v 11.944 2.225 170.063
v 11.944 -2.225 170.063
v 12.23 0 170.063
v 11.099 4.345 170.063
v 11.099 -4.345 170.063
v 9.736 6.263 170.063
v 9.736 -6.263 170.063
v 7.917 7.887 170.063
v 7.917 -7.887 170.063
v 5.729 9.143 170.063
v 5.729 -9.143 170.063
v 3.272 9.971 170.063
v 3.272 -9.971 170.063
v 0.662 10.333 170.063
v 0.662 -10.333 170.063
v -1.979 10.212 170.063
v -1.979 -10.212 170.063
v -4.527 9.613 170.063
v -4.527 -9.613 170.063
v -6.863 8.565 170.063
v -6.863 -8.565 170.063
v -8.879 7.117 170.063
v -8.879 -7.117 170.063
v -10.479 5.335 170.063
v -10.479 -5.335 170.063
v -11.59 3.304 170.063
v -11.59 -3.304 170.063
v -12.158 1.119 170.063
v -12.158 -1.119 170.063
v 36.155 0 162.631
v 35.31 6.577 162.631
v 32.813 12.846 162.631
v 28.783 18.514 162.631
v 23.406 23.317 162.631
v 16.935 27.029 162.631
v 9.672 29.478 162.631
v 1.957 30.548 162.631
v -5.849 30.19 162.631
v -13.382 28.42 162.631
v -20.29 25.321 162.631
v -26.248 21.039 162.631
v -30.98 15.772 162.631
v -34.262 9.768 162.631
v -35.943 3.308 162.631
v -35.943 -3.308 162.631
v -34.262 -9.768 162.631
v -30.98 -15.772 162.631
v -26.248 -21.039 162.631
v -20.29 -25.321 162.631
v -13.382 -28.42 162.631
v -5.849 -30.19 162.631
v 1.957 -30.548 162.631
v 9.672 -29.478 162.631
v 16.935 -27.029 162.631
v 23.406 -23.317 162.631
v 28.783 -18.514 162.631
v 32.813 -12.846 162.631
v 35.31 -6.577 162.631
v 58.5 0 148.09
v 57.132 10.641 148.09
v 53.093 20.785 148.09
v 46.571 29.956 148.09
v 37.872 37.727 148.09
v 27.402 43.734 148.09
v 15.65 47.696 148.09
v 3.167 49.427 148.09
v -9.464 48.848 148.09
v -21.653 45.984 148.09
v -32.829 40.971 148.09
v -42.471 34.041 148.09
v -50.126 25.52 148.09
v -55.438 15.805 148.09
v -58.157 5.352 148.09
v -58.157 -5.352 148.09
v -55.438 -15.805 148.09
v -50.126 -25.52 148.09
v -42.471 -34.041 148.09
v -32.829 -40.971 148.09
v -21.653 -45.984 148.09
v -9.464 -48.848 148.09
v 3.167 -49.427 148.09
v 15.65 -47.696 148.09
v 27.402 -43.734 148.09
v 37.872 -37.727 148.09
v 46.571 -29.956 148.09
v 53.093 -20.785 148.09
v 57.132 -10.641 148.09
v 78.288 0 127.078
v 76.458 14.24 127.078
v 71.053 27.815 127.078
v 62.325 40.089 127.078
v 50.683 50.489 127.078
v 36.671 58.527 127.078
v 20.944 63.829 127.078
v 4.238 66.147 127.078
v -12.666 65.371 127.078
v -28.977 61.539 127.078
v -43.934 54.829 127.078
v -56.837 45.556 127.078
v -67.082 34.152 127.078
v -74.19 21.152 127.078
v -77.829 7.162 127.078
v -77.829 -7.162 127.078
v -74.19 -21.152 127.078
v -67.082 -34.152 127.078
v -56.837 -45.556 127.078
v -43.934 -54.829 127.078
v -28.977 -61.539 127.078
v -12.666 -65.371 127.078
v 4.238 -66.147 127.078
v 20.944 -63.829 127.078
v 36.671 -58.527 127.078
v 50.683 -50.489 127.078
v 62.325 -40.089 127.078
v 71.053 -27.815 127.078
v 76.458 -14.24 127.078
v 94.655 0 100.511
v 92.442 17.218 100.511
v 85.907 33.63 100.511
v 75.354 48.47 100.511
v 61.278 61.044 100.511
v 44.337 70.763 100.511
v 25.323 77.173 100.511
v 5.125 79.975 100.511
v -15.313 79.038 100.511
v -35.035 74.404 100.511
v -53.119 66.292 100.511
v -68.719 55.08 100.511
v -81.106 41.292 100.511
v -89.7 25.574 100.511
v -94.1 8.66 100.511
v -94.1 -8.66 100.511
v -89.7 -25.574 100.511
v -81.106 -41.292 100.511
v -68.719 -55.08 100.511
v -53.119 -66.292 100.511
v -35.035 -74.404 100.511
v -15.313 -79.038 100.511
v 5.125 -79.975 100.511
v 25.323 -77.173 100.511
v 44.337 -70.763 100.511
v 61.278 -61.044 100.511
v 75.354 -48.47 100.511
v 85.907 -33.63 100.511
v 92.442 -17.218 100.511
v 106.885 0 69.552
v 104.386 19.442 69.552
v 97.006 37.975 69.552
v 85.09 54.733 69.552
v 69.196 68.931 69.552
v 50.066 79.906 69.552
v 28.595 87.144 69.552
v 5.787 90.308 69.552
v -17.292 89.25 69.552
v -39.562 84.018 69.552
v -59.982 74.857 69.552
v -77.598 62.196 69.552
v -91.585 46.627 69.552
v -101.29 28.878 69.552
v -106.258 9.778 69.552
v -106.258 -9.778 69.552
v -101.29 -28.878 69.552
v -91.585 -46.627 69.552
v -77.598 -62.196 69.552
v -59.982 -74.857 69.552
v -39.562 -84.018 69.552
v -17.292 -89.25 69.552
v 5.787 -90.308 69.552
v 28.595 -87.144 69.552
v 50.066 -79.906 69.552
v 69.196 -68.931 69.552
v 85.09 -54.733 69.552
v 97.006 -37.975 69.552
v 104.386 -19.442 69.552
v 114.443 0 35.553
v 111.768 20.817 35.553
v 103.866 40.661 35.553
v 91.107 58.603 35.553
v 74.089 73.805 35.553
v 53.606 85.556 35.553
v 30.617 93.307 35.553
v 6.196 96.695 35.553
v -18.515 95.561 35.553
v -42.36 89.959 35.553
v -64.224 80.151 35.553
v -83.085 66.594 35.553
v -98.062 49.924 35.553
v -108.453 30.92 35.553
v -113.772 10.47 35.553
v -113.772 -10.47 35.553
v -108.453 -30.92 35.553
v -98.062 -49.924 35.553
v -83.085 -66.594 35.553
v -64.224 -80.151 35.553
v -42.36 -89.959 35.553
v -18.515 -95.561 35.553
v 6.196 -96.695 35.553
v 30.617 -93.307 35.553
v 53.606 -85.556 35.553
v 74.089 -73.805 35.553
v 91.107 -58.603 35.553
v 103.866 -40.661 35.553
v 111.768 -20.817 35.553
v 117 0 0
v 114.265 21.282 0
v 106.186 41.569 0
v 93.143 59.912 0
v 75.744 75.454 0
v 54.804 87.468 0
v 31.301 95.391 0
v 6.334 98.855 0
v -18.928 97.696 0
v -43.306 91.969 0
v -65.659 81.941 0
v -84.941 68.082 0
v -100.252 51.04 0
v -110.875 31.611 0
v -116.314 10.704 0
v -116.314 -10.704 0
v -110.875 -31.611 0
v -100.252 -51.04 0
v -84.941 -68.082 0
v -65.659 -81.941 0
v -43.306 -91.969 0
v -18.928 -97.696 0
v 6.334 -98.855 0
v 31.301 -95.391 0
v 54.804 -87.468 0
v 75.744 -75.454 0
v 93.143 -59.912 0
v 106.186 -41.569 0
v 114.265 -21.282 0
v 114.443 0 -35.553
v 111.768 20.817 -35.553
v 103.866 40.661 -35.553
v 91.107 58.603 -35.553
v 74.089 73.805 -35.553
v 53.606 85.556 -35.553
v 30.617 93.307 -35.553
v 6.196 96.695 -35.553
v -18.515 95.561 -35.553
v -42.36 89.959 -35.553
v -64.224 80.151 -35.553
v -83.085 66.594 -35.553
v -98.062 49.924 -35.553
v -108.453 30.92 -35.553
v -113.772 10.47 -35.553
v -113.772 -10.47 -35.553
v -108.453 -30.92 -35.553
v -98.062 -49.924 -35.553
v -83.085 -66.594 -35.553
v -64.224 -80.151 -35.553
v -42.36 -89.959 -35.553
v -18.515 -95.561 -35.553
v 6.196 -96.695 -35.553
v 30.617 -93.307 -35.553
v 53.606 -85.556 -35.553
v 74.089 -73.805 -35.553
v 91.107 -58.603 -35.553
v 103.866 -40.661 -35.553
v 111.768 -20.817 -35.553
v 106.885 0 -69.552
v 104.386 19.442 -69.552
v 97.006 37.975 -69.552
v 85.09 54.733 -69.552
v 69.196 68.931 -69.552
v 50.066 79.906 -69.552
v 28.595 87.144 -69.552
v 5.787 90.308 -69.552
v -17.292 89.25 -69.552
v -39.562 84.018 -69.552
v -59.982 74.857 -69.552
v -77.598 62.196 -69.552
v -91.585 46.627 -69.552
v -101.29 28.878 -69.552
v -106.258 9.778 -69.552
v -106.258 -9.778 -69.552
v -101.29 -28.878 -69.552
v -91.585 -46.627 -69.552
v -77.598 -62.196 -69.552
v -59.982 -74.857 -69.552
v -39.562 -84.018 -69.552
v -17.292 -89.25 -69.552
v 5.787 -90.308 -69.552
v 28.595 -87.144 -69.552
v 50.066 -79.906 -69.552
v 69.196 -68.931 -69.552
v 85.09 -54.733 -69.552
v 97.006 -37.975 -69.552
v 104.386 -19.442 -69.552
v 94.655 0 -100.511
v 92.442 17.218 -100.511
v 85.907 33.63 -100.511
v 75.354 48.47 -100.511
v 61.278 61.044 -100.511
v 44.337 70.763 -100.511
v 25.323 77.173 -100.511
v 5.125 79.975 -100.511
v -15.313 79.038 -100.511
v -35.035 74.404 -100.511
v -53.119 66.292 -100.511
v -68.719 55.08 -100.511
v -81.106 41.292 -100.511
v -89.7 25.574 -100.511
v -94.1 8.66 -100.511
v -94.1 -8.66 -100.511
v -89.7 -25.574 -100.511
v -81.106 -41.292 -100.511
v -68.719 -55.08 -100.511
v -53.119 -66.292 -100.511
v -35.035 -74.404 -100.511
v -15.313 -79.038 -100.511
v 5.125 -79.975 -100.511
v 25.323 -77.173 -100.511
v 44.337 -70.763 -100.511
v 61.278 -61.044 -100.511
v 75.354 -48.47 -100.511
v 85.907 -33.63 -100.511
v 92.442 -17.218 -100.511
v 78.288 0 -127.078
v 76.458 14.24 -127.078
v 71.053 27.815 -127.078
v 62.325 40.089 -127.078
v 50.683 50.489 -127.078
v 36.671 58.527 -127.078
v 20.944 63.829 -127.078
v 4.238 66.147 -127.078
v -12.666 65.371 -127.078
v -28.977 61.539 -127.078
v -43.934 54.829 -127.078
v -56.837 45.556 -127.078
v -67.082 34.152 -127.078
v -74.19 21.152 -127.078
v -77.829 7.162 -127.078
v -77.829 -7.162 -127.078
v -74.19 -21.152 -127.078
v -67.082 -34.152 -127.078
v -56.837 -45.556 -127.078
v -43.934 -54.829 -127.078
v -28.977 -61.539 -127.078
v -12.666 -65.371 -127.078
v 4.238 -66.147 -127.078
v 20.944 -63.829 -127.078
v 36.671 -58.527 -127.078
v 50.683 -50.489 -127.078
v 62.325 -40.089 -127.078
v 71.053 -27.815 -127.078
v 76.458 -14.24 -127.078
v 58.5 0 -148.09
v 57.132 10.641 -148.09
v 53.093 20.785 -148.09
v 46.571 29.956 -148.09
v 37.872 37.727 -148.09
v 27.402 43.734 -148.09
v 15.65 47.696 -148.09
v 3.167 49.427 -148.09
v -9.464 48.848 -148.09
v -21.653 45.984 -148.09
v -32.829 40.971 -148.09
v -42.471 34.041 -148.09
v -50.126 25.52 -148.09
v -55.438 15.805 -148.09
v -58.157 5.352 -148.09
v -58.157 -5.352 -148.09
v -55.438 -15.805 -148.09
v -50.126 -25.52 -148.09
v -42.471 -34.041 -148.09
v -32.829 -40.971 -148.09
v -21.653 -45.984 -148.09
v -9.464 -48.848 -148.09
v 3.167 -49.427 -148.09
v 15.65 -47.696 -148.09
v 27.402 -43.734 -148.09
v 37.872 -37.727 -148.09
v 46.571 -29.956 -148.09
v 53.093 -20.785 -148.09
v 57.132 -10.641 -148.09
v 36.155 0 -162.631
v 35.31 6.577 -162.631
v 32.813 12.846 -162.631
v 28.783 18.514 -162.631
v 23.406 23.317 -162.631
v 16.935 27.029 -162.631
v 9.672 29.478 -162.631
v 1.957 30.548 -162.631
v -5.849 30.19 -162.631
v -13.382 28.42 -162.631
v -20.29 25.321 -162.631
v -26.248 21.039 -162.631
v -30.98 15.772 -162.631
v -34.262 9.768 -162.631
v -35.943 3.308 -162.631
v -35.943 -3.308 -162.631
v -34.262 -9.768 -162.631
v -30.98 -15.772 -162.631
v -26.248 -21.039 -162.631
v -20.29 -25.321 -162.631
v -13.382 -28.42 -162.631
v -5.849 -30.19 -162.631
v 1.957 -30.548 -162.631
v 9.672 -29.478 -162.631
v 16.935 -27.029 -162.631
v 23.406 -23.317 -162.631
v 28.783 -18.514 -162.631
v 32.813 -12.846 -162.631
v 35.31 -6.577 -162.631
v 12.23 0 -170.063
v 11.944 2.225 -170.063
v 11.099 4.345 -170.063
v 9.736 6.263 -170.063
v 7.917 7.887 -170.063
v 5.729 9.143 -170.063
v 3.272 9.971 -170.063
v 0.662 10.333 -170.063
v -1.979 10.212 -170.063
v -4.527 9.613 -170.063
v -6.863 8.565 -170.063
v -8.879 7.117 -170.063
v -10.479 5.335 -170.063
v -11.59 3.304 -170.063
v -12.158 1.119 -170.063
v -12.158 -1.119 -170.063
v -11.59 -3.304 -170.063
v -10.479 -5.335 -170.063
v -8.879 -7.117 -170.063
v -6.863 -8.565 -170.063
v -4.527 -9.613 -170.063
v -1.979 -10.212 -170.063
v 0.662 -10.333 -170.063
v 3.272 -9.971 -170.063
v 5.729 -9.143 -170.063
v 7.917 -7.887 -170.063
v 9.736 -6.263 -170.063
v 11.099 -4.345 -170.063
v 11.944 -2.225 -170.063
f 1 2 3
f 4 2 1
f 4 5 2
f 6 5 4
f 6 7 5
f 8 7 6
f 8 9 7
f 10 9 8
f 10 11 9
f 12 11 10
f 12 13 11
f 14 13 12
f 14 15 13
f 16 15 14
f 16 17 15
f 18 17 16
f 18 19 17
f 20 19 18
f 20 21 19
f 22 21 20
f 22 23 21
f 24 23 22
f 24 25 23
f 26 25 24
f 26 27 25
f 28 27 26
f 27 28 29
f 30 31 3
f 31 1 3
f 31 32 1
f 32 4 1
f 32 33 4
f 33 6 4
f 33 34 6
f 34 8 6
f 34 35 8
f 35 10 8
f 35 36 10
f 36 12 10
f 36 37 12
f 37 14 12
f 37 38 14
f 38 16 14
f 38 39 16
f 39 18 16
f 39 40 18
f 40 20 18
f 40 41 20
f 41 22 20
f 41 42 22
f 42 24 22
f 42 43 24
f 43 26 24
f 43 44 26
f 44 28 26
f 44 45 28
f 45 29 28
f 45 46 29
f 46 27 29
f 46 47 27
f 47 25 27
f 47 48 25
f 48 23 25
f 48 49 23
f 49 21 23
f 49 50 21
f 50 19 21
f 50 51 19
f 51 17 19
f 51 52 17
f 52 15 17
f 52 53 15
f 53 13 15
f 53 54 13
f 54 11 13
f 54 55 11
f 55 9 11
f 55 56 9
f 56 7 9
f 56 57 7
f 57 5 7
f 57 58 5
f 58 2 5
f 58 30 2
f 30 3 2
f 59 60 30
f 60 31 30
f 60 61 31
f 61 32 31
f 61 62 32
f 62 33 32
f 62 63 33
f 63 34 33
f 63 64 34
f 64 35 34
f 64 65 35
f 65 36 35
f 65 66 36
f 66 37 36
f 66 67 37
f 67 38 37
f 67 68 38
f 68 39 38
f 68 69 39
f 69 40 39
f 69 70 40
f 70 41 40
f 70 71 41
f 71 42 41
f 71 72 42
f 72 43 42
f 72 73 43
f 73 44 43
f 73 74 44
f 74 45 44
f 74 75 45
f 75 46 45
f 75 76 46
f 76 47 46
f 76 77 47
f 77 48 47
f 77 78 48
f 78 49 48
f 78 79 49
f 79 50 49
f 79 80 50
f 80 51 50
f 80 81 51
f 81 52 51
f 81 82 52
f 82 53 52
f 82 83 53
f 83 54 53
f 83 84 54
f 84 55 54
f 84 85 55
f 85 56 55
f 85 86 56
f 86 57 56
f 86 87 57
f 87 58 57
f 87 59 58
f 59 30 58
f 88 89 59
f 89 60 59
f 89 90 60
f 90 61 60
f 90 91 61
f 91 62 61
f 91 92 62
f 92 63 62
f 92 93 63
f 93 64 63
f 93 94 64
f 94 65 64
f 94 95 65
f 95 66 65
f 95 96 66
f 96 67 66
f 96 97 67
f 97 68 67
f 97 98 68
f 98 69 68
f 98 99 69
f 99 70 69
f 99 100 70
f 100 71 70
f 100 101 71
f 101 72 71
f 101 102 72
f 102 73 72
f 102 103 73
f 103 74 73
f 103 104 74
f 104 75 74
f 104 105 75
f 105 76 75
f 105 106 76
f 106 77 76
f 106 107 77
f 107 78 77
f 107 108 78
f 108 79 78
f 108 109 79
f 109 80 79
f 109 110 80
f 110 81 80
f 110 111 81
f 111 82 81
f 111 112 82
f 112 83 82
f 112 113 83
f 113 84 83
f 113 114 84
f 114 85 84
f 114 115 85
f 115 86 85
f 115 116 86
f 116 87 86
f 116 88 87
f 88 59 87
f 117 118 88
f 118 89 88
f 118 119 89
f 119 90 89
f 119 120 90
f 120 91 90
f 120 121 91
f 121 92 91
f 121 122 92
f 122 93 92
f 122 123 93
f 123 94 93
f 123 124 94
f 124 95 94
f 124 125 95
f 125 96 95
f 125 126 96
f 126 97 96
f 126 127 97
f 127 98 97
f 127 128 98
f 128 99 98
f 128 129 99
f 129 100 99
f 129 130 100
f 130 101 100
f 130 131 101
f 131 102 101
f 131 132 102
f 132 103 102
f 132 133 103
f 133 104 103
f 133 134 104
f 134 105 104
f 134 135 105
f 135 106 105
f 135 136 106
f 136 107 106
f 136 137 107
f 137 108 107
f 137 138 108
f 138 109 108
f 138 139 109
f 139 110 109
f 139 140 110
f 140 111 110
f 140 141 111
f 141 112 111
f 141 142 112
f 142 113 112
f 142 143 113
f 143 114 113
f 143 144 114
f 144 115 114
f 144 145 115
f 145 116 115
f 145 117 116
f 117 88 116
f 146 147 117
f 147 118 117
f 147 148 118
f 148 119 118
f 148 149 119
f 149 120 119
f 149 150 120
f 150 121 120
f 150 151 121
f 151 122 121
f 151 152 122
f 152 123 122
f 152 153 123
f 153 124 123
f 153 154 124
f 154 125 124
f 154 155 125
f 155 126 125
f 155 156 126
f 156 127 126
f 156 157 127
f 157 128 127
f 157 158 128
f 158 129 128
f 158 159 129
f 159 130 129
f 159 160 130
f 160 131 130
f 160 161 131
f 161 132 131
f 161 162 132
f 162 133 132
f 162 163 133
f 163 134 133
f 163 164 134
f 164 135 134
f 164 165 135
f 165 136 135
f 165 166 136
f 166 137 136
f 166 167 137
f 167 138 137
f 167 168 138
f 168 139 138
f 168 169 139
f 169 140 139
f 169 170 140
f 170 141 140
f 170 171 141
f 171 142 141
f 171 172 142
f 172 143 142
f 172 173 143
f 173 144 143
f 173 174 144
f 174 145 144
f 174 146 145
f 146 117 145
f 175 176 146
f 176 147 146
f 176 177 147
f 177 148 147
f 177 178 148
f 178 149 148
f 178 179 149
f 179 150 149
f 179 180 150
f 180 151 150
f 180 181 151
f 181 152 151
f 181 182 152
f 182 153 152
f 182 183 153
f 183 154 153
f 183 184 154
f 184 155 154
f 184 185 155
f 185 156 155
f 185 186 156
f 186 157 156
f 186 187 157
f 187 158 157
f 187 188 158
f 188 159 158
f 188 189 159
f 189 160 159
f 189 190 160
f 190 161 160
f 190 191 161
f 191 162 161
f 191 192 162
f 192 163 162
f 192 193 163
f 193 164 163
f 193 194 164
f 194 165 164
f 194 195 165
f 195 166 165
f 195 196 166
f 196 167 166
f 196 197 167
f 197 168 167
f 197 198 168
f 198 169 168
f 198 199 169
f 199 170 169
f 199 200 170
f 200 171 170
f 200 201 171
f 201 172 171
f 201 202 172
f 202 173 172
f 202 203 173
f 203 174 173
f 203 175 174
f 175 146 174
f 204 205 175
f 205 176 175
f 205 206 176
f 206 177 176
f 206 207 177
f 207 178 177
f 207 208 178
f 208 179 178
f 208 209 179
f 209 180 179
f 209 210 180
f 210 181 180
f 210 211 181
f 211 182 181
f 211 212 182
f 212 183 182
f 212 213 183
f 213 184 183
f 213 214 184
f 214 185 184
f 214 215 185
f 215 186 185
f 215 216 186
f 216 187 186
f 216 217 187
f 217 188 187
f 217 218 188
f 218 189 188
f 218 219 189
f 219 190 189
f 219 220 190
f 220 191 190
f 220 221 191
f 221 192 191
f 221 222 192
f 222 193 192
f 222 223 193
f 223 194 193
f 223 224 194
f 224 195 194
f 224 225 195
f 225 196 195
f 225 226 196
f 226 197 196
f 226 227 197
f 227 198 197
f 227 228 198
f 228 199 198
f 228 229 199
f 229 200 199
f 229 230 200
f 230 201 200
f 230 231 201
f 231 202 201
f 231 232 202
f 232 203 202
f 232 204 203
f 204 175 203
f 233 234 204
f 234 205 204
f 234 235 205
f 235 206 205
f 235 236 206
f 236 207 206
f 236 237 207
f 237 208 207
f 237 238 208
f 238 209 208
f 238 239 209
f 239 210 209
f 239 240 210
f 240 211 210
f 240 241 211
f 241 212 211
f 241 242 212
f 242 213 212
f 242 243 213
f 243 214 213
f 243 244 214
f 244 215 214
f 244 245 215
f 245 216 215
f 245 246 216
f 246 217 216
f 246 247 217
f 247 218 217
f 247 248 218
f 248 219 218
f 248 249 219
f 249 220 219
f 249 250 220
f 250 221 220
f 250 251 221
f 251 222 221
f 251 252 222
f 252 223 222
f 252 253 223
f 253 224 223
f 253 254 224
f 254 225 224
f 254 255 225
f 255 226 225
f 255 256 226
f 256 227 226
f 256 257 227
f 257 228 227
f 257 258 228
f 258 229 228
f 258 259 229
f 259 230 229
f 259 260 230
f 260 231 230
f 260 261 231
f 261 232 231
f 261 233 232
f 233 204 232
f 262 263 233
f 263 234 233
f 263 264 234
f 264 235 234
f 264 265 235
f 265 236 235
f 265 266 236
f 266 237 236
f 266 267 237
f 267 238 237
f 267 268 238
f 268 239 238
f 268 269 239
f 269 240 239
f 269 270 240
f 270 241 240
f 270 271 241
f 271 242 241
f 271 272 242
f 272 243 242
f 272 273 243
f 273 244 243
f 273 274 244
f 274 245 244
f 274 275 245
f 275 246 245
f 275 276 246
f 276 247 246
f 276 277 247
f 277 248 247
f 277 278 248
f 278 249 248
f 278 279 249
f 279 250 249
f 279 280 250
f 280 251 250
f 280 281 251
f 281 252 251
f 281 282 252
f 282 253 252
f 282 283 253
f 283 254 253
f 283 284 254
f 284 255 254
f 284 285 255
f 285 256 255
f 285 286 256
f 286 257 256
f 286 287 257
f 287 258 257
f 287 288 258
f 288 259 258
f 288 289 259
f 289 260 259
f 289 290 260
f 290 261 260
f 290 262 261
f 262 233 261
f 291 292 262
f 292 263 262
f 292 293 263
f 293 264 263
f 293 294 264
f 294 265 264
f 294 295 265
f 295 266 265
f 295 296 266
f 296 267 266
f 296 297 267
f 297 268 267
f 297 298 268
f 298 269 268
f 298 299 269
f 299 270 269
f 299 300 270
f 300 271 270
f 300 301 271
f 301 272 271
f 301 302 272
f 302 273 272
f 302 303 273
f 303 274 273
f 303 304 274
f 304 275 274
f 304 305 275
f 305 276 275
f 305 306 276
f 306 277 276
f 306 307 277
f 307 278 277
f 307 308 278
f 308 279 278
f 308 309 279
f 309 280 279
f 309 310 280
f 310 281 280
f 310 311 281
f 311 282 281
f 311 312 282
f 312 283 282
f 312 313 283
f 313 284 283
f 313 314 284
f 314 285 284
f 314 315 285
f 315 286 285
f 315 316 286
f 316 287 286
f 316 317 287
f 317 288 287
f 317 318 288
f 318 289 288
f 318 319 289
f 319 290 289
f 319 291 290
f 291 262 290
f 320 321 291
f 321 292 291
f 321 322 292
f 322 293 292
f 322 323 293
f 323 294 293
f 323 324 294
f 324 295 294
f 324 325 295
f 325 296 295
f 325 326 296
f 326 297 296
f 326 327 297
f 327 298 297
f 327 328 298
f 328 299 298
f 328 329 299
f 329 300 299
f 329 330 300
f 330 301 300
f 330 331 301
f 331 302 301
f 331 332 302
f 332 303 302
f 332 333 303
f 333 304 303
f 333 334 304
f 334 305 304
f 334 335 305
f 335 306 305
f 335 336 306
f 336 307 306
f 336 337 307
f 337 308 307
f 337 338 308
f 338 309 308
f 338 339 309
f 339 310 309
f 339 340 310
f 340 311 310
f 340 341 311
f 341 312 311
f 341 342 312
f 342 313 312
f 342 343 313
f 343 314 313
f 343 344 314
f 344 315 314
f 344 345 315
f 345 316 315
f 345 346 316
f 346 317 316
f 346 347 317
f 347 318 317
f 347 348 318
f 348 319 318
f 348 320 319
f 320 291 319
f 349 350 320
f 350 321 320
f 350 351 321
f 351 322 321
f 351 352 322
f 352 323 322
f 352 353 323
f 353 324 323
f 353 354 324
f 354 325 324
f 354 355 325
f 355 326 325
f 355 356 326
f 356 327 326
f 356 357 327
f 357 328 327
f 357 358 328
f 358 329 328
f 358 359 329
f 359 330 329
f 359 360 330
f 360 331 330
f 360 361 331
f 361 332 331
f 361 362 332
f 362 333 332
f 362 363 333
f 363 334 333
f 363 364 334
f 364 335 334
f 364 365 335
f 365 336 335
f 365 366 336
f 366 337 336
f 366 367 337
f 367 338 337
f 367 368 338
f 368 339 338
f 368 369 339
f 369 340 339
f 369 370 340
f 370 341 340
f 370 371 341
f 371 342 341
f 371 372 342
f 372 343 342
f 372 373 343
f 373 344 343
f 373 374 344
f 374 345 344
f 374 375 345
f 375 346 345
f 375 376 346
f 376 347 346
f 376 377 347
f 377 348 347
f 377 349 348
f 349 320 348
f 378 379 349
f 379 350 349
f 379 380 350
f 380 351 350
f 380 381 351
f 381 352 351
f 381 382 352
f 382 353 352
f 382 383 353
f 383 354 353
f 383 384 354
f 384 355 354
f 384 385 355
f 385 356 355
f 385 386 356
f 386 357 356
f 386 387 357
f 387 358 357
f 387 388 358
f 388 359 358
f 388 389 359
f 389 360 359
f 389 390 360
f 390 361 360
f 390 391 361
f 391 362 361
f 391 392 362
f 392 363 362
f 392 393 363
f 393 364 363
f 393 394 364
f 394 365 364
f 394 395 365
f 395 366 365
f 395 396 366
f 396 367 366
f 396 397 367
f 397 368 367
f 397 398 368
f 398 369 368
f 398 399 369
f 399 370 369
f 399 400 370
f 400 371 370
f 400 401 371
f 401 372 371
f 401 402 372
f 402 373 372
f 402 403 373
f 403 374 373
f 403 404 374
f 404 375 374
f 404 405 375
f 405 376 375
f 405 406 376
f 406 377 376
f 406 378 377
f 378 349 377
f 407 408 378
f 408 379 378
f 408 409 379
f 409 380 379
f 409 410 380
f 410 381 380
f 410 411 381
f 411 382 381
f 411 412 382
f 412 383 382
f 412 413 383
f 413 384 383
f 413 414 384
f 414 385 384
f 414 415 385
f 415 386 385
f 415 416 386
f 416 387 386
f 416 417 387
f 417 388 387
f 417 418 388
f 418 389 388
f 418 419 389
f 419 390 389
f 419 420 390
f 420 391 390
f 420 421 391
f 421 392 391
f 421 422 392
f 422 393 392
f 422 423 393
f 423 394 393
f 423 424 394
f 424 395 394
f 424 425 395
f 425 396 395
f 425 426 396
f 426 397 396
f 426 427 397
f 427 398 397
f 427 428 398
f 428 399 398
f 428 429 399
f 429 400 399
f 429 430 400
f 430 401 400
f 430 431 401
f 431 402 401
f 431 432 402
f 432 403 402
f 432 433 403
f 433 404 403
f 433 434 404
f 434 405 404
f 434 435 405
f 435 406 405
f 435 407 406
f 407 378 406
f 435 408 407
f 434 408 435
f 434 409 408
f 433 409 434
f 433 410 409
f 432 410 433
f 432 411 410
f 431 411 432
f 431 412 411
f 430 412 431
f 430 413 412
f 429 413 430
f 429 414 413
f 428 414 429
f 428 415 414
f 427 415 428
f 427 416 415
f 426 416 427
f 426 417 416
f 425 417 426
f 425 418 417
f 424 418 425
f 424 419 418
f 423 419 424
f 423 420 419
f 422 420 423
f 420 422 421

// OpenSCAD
// Generated by SolidPython 1.0.1 on 2020-07-29 00:46:51


scale(v = [13, 11, 19]) {
	sphere(r = 9);
}
/***********************************************
*********      SolidPython code:      **********
************************************************
 
# import packages: SolidPython
from solid import *
from solid.utils import *
from itertools import chain, combinations, permutations


class Resize:

    def __init__(self, scad_file):
        self.scad_file = scad_file
        #self.scad_file = import_scad(scad_file)
        # cone/cylinder param:
        self.r1 = 0
        self.r2 = 0
        self.h = 0
        # rectangular prism param:
        self.w = 0
        self.l = 0
        # ellipse param:
        self.r = 0

    # import OpenScad code (file name corresponds to shape)


    # classify shape + parameters
    def assign(self, param1, param2, param3):
        if self.scad_file == 'cone.scad':
            self.r1 = param1
            self.r2 = param2
            self.h = param3
        elif self.scad_file == 'cylinder.scad':
            self.r1 = param1
            self.r2 = param2
            self.h = param3
        elif self.scad_file == 'rectangularPrism.scad':
            self.h = param1
            self.l = param2
            self.w = param3
        else:
            self.r = param1
            self.h = param2

    # resize parameters
    def iterate(self):
        x = range(3, 20, 2)
        i = 1
        if self.scad_file == 'cone.scad':
            tempList = list(permutations(x, 2))
            for temp in tempList:
                param1 = temp[0]
                param2 = temp[1]
                filepath = 'produced_scad_files/' + 'cone' + str(param1) + '_' + str(param2) + '_' + '.scad'
                scad_render_to_file(cylinder(h=param1, r1=param2, r2=0), filepath)

        elif self.scad_file == 'cylinder.scad':
            tempList = list(permutations(x, 3))
            for temp in tempList:
                param1 = temp[0]
                param2 = temp[1]
                filepath = 'produced_scad_files/' + 'cylinder' + str(param1) + '_' + str(param2) + '_' + '.scad'
                scad_render_to_file(cylinder(h=param1, r1=param2, r2=param2), filepath)

        elif self.scad_file == 'rectangularPrism.scad':
            tempList = list(permutations(x, 3))
            for temp in tempList:
                param1 = temp[0]
                param2 = temp[1]
                param3 = temp[2]
                filepath = 'produced_scad_files/' + 'rectangularPrism' + str(param1) + '_' + str(param2) + '_' + str(
                    param3) + '.scad'
                scad_render_to_file(cube(size=(param1, param2, param3)), filepath)

        elif self.scad_file == 'ellipse.scad':
            tempList = list(permutations(x, 4))
            for temp in tempList:
                param1 = temp[0]
                param2 = temp[1]
                param3 = temp[2]
                param4 = temp[3]
                filepath = 'produced_scad_files/' + 'ellipse' + str(param1) + '_' + str(param2) + '_' + str(param3) + '_' + str(param4) + '.scad'
                scad_render_to_file(scale([param1, param2, param3])(sphere(r=param4)), filepath)

    def render_to_scadfile(self):
        scad_render_to_file(scad, 'example.scad') 
 
************************************************/
